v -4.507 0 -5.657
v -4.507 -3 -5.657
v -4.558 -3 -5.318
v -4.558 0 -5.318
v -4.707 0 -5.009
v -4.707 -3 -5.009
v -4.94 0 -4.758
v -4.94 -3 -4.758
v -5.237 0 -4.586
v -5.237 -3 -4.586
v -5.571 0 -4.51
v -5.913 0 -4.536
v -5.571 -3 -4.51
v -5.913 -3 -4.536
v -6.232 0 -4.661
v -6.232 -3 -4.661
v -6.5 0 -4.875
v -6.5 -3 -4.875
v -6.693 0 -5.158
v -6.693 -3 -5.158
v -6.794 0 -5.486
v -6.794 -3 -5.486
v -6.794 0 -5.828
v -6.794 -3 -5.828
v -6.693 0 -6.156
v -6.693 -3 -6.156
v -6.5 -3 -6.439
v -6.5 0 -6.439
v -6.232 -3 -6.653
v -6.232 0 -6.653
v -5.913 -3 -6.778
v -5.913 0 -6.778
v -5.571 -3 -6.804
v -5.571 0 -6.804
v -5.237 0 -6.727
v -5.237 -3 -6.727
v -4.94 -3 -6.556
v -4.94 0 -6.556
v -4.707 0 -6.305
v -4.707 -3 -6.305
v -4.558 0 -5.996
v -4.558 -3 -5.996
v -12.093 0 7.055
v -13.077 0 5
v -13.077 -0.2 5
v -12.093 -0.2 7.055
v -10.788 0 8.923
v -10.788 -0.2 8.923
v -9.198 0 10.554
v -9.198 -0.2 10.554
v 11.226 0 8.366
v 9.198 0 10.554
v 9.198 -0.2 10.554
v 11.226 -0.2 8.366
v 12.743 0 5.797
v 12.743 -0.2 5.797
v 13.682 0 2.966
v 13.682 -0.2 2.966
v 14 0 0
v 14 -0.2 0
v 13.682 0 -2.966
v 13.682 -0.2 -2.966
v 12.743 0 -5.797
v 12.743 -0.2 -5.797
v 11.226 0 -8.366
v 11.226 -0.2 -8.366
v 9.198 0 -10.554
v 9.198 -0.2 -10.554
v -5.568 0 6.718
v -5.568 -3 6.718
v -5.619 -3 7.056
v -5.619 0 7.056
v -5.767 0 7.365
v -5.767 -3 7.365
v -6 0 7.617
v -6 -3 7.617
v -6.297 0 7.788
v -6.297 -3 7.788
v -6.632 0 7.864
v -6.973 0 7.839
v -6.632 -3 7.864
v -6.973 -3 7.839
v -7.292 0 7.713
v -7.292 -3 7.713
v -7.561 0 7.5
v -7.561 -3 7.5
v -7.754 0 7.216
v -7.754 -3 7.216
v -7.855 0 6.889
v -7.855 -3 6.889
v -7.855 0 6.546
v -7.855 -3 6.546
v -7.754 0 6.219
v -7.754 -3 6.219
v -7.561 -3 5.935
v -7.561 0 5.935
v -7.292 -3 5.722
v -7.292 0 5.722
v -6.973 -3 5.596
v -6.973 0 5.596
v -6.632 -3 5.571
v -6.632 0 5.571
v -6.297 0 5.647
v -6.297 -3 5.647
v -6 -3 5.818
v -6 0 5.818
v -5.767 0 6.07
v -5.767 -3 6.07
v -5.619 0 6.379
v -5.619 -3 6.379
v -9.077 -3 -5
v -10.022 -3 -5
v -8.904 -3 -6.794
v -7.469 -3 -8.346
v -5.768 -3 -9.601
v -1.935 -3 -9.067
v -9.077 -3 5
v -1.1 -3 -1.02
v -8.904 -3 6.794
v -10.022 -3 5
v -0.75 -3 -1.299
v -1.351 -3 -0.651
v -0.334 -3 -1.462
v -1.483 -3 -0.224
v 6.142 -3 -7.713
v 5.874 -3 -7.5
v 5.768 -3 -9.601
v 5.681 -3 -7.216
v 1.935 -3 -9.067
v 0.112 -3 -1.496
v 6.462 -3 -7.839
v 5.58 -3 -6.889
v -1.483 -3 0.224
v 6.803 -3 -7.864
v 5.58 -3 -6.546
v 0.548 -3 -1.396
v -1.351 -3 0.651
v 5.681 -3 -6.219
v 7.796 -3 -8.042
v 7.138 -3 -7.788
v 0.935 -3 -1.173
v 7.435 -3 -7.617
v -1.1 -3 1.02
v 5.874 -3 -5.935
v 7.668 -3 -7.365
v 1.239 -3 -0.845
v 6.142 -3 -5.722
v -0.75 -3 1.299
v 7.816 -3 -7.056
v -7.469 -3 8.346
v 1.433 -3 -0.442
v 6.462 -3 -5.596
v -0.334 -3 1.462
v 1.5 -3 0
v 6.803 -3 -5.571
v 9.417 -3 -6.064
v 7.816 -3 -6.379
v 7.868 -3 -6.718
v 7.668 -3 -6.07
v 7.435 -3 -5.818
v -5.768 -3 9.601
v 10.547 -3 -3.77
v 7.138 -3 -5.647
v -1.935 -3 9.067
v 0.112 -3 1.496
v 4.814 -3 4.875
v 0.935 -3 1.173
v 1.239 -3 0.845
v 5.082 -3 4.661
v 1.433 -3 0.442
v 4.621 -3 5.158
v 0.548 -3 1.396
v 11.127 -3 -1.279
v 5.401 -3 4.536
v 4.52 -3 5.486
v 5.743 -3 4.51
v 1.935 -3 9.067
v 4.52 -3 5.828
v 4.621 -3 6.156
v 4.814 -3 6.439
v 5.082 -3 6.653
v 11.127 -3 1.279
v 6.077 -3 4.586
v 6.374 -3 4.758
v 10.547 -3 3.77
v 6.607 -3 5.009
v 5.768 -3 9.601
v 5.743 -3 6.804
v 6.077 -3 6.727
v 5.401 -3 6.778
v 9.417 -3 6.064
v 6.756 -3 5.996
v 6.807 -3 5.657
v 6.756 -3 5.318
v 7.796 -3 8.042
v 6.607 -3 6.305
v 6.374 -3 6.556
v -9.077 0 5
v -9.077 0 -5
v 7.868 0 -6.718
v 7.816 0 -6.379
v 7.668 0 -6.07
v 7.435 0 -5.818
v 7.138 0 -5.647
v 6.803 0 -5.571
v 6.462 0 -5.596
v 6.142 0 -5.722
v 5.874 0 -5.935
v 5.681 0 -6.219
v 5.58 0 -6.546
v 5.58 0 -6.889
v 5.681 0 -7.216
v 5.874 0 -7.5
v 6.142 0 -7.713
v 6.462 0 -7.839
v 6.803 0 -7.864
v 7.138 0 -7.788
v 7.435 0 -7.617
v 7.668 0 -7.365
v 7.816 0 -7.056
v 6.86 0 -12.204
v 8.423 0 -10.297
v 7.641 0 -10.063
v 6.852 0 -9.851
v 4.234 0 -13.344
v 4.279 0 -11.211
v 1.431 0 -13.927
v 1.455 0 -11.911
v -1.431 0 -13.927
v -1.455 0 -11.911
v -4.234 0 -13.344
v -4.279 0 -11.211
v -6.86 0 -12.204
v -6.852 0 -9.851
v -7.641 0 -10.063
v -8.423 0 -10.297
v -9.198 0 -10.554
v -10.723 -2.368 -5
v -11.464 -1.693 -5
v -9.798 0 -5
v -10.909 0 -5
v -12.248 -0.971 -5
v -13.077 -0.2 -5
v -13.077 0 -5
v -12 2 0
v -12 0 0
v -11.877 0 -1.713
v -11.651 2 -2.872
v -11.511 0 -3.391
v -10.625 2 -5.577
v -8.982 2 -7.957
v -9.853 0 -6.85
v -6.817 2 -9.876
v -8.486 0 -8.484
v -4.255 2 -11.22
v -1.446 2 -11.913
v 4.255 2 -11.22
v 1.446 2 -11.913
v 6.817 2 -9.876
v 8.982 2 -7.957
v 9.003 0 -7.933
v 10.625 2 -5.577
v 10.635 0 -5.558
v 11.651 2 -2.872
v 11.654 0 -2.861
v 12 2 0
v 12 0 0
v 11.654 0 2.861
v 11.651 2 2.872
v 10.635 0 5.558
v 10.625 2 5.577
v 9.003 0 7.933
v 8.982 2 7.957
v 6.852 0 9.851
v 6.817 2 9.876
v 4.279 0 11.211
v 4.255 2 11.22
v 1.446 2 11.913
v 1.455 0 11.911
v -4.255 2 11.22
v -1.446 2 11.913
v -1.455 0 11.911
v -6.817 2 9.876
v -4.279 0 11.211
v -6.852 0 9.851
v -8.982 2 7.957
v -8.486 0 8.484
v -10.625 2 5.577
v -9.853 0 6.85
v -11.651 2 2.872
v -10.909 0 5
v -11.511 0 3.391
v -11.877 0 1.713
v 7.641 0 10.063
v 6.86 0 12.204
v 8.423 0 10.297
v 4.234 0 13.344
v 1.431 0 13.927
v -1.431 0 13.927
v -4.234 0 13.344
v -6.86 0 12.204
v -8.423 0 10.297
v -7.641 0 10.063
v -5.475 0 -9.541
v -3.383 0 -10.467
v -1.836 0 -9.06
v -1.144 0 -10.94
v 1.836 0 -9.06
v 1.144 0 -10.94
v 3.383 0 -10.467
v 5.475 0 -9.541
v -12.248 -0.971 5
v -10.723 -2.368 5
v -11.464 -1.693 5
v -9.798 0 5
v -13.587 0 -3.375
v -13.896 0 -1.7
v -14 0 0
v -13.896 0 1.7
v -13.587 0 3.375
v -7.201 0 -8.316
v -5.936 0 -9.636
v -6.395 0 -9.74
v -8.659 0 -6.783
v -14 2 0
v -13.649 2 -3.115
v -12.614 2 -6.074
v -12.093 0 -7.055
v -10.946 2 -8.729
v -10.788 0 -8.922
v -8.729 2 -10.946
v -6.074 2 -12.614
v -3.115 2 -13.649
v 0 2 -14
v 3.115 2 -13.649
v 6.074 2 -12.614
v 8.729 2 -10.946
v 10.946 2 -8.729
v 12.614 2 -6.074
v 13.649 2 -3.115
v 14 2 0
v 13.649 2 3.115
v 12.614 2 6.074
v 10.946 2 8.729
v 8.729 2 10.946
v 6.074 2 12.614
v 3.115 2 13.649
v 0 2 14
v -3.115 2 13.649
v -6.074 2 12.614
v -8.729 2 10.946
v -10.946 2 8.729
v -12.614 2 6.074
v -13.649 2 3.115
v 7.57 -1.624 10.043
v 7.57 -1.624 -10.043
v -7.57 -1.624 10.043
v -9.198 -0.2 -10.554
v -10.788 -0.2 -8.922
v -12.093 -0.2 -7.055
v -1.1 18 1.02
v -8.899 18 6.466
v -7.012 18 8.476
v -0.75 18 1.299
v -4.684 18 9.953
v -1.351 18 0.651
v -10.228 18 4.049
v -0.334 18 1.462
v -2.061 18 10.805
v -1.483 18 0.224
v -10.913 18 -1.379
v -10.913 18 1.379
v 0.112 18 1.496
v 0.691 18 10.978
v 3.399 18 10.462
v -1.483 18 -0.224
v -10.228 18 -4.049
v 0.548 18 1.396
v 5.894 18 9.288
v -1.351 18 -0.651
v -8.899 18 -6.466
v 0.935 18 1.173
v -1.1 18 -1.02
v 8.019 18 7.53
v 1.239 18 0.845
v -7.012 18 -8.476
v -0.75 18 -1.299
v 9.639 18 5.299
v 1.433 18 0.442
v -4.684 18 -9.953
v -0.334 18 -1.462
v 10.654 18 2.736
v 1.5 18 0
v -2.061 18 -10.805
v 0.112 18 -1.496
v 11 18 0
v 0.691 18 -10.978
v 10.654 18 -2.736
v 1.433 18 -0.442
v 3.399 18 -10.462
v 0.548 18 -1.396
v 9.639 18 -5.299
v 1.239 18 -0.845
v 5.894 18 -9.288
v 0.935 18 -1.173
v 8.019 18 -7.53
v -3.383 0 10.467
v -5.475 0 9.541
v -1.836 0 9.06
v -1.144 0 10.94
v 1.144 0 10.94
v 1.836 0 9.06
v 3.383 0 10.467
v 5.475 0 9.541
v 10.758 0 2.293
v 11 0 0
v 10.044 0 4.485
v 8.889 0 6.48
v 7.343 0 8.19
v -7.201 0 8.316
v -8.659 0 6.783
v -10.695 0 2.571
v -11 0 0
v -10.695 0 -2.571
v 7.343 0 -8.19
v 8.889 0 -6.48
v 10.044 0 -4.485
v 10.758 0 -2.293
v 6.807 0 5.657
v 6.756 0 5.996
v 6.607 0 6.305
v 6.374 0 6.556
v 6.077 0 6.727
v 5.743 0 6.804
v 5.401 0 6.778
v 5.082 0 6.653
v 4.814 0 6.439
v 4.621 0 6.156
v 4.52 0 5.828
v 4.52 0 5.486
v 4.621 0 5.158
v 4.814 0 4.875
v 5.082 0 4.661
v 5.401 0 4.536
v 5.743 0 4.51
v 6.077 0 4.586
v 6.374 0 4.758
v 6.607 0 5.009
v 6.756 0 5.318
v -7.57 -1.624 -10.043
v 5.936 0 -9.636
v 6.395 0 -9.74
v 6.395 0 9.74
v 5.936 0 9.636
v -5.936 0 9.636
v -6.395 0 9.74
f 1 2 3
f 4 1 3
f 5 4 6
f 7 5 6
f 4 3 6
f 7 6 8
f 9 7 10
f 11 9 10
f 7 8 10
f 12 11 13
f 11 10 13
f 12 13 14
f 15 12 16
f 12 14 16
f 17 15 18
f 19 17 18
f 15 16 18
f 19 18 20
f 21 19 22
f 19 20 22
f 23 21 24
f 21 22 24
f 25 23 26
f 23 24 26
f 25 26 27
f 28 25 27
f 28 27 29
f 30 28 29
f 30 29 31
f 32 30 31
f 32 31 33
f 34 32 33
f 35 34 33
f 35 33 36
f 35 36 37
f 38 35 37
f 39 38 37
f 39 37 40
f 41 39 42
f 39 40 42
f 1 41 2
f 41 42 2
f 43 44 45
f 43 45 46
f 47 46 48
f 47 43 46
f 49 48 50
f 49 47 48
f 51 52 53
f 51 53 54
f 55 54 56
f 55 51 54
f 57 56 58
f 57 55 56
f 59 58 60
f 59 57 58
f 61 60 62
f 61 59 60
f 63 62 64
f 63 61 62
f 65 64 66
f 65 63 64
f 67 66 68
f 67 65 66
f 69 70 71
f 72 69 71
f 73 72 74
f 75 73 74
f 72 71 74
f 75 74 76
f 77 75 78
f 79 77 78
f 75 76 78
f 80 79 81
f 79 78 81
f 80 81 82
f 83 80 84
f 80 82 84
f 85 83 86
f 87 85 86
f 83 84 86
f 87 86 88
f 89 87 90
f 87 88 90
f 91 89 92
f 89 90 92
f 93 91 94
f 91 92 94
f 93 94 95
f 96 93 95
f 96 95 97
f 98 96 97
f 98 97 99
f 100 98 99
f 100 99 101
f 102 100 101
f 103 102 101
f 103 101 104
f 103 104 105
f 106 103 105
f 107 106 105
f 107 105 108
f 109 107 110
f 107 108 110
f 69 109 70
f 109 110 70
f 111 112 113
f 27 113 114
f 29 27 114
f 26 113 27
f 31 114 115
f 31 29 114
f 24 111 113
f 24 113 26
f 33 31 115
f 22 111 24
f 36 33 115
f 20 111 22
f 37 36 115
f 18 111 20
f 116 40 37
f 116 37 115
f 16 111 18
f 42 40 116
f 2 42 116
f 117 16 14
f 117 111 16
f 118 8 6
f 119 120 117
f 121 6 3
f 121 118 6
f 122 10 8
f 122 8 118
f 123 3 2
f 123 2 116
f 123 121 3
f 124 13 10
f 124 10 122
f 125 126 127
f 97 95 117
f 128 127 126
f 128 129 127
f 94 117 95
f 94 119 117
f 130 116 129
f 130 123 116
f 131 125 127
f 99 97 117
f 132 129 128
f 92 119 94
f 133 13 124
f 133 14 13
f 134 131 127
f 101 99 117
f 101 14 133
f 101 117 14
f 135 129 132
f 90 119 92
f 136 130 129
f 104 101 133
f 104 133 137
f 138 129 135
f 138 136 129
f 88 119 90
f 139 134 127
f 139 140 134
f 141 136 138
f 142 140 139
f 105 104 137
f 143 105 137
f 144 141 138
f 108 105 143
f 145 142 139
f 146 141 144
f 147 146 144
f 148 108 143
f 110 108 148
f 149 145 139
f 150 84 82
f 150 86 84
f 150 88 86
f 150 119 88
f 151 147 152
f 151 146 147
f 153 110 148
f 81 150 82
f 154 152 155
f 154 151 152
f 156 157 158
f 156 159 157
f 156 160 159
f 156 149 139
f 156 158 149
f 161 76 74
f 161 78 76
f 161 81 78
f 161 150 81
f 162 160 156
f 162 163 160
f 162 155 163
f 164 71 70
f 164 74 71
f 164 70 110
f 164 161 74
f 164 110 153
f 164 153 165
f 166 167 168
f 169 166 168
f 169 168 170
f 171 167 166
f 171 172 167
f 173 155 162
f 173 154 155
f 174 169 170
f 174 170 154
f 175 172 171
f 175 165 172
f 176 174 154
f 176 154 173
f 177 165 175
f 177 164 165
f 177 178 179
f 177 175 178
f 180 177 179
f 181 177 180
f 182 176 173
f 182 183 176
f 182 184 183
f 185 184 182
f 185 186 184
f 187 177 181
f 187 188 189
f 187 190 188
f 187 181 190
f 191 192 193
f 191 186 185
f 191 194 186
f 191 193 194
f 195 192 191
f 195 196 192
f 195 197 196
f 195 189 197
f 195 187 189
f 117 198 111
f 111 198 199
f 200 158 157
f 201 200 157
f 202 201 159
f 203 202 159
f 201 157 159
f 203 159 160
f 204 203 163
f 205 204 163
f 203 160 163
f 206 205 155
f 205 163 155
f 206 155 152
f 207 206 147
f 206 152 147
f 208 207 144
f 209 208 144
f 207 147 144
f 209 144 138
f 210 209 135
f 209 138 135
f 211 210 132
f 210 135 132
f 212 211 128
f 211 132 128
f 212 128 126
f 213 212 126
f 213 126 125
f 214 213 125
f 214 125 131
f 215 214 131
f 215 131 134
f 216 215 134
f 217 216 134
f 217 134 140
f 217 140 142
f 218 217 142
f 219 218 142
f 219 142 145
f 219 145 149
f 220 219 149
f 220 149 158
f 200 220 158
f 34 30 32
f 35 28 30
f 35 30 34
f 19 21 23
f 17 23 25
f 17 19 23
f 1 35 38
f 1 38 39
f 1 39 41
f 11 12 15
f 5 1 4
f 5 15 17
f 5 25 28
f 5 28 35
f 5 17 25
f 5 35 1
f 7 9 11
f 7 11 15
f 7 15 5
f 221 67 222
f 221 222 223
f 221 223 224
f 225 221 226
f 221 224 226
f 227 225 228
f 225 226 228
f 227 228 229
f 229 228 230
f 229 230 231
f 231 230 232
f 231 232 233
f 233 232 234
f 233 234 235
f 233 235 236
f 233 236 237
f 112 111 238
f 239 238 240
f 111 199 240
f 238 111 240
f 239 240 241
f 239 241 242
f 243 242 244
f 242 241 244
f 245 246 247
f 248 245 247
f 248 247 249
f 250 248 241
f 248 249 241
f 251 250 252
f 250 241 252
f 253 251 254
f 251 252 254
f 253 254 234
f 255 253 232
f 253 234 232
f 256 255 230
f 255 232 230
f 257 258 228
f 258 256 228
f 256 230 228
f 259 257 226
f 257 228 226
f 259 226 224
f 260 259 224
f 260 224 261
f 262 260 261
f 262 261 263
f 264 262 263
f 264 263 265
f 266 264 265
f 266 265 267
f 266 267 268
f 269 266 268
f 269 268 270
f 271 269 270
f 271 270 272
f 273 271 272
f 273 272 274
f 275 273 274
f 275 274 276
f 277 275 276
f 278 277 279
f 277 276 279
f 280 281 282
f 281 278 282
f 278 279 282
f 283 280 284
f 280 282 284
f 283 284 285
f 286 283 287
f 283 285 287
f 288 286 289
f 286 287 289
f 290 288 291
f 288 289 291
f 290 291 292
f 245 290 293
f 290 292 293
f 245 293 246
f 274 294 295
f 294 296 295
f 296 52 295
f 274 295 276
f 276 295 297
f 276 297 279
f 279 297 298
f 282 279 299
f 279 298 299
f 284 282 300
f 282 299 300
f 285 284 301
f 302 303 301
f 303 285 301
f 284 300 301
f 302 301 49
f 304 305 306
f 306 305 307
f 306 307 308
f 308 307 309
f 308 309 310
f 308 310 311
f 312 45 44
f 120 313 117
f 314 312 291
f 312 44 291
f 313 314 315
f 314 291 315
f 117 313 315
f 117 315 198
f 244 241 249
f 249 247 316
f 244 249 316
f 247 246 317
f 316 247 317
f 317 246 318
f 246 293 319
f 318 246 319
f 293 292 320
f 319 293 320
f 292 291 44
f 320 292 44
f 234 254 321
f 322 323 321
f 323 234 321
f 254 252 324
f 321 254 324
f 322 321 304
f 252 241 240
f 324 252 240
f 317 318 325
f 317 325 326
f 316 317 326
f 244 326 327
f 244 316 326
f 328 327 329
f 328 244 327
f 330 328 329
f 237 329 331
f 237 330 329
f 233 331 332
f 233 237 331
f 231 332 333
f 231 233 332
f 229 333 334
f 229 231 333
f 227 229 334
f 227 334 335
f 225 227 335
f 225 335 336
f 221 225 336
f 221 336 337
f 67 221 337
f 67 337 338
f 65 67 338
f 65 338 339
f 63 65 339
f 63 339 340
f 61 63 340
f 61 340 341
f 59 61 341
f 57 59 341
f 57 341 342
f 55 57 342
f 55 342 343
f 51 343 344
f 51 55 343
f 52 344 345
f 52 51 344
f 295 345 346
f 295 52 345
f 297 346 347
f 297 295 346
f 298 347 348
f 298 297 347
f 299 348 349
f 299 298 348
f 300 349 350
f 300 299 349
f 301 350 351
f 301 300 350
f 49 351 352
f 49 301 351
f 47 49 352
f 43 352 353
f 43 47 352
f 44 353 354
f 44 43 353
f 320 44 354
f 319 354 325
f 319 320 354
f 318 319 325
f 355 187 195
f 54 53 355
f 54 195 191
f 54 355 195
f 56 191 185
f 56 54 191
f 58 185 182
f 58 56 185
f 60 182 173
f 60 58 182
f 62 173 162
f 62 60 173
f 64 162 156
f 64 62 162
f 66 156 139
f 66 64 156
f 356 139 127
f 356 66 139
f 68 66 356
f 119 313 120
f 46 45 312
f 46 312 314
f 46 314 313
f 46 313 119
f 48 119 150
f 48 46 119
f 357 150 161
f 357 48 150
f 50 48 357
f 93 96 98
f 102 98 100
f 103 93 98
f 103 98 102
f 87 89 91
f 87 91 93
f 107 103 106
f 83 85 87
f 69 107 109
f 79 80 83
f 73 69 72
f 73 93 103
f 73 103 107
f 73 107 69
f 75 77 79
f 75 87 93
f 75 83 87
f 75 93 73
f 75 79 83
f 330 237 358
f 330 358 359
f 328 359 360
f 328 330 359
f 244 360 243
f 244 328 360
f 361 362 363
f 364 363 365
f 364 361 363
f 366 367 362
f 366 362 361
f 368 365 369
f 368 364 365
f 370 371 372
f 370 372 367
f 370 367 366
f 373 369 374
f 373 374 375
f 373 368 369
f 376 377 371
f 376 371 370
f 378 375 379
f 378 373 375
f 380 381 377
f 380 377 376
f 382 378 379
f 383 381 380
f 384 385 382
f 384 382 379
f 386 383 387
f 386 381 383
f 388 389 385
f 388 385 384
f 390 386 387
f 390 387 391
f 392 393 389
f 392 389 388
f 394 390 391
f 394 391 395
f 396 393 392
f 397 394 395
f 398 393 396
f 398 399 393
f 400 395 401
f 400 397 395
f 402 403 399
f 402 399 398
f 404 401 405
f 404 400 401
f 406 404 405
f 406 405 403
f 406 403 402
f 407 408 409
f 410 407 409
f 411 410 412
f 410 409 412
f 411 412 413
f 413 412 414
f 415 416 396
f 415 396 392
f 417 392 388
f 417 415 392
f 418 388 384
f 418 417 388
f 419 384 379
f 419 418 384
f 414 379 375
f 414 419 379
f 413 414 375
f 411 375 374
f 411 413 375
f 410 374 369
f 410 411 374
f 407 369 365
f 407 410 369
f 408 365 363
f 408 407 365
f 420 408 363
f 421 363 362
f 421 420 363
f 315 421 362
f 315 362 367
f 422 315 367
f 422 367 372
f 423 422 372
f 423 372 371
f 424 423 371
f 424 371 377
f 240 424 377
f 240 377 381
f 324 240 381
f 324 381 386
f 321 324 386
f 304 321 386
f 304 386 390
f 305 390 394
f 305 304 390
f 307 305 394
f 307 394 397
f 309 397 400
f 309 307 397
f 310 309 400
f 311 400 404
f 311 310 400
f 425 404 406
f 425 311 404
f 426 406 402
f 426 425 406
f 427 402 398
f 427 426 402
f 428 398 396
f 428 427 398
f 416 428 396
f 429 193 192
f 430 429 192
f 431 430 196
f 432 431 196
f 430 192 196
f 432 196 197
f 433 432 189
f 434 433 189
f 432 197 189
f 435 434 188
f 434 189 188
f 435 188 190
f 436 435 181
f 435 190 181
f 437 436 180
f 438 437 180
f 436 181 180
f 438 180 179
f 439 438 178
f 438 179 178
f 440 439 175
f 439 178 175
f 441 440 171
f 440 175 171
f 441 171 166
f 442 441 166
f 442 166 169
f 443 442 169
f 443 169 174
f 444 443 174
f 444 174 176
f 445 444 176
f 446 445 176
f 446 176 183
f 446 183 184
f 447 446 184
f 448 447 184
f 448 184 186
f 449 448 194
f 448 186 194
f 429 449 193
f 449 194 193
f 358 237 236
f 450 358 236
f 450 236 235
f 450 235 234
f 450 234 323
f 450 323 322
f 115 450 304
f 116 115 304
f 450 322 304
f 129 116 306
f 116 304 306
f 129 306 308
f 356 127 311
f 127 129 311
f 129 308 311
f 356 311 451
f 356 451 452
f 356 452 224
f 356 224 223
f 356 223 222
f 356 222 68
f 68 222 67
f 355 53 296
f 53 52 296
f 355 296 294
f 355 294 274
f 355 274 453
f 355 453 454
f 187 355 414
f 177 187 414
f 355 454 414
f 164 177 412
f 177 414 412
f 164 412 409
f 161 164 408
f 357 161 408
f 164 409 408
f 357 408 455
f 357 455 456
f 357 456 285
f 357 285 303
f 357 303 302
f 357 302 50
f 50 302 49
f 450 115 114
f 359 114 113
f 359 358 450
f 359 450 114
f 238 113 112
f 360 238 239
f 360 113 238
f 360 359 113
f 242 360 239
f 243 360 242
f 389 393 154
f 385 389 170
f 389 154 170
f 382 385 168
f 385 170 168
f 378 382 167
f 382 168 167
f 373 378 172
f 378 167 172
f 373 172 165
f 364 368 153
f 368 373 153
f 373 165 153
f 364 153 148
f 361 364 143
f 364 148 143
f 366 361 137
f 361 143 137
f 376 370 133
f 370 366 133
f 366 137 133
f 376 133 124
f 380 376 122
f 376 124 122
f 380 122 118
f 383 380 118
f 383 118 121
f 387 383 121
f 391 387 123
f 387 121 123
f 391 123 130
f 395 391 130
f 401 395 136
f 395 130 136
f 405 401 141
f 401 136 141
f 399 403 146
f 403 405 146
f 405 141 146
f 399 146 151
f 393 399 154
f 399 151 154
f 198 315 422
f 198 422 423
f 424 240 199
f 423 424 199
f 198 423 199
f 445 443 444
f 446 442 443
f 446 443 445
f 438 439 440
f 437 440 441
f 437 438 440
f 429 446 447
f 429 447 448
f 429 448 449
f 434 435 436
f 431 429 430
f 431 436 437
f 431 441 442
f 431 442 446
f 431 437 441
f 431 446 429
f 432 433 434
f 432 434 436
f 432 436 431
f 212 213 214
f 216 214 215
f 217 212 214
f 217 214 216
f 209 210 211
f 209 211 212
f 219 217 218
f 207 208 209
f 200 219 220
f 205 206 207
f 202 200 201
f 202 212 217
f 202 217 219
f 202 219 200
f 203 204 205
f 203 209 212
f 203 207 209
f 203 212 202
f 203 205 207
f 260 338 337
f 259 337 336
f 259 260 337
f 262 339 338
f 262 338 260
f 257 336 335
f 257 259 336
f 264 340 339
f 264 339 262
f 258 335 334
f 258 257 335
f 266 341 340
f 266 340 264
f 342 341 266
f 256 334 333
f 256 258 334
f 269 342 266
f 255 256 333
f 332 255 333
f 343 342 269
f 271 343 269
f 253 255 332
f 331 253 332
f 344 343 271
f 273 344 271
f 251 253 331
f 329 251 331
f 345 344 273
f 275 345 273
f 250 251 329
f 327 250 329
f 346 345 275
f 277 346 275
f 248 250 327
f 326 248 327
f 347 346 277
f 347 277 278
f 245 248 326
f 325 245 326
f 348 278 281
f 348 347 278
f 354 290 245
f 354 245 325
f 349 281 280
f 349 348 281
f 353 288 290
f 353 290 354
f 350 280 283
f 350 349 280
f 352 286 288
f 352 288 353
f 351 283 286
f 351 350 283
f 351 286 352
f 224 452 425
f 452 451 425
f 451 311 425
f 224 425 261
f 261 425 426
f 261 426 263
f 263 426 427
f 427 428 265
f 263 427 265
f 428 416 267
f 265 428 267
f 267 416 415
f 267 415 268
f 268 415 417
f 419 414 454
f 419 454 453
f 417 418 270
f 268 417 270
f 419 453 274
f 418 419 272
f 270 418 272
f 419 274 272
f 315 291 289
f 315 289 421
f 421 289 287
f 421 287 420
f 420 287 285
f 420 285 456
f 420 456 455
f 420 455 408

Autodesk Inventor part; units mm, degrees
ref_plane "YZ Plane" through (0, 0, 0) normal (1, 0, 0) x (0, 1, 0)
ref_plane "XZ Plane" through (0, 0, 0) normal (0, 1, 0) x (-1, 0, 0)
ref_plane "XY Plane" through (0, 0, 0) normal (0, 0, 1) x (1, 0, 0)
sketch "Sketch1" plane through (0, 0, 0) normal (0, 1, 0) x (-1, 0, 0)
  circle A0 centre (0, 0) radius 14
  circle A1 centre (0, 0) radius 12
  dimension "d0" = 28
  dimension "d1" = 2
extrude "Extrusion1" add sketch "Sketch1" along normal blind 2
sketch "Sketch2" plane through (0, 0, 0) normal (0, -1, 0) x (1, 0, 0)
  line L0 (0, 0) -> (0, -37) construction
  arc A0 (9.1985, -10.5541) -> (-9.1985, -10.5541) centre (0, -37) ccw
  line L1 (0, 0) -> (0, 37) construction
  arc A1 (-9.1985, 10.5541) -> (9.1985, 10.5541) centre (0, 37) ccw
  line L2 (-13.0767, 5) -> (-9.0767, 5)
  line L3 (-9.0767, 5) -> (-9.0767, -5)
  line L4 (-9.0767, -5) -> (-13.0767, -5)
  line L5 (-7.8662, 0) -> (-7.8662, -5) construction
  arc A2 (9.1985, -10.5541) -> (9.1985, 10.5541) centre (0, 0) ccw
  arc A3 (-9.1985, 10.5541) -> (-13.0767, 5) centre (0, 0) ccw
  arc A4 (-13.0767, -5) -> (-9.1985, -10.5541) centre (0, 0) ccw
  line L6 (0, 0) -> (-9.0767, 0)
  dimension "d8" = 56
  dimension "d10" = 37
  dimension "d11" = 5
  dimension "d12" = 4
extrude "Extrusion2" add sketch "Sketch2" along normal blind 3
sketch "Sketch3" plane through (0, -3, 0) normal (0, -1, 0) x (1, 0, 0)
  circle A0 centre (0, 0) radius 1.5
  dimension "d15" = 3
extrude "Extrusion3" cut sketch "Sketch3" against normal through all
chamfer "Chamfer1" distance 2.8 angle 45 3 edges at (-11.4786, -3, -8.0151) (-11.4786, -3, 8.0151) (14, -3, 0)
sketch "Sketch4" plane through (0, 0, 0) normal (0, 1, 0) x (1, 0, 0)
  circle A0 centre (0, 0) radius 1.5
  circle A1 centre (0, 0) radius 11
  dimension "d21" = 22
  dimension "d22" = 3
extrude "Extrusion4" add sketch "Sketch4" along normal blind 18
sketch3d "Sketch6"
sketch " Sketch6" plane through (0, -3, 0) normal (0, -1, 0) x (1, 0, 0)
  line L0 (-6.7175, 6.7175) -> (6.7175, -6.7175) construction
  line L1 (5.6569, 5.6569) -> (-5.6569, -5.6569) construction
  circle A0 centre (-5.6569, -5.6569) radius 1.15
  circle A1 centre (6.7175, -6.7175) radius 1.15
  circle A2 centre (-6.7175, 6.7175) radius 1.15
  circle A3 centre (5.6569, 5.6569) radius 1.15
  circle A4 centre (0, 0) radius 1.5 construction
  line L2 (0, 0) -> (31.4092, 0) construction
extrude "Extrusion5" cut sketch " Sketch6" against normal up to surface (3 mm away)
properties part number "BrushlessInner"
